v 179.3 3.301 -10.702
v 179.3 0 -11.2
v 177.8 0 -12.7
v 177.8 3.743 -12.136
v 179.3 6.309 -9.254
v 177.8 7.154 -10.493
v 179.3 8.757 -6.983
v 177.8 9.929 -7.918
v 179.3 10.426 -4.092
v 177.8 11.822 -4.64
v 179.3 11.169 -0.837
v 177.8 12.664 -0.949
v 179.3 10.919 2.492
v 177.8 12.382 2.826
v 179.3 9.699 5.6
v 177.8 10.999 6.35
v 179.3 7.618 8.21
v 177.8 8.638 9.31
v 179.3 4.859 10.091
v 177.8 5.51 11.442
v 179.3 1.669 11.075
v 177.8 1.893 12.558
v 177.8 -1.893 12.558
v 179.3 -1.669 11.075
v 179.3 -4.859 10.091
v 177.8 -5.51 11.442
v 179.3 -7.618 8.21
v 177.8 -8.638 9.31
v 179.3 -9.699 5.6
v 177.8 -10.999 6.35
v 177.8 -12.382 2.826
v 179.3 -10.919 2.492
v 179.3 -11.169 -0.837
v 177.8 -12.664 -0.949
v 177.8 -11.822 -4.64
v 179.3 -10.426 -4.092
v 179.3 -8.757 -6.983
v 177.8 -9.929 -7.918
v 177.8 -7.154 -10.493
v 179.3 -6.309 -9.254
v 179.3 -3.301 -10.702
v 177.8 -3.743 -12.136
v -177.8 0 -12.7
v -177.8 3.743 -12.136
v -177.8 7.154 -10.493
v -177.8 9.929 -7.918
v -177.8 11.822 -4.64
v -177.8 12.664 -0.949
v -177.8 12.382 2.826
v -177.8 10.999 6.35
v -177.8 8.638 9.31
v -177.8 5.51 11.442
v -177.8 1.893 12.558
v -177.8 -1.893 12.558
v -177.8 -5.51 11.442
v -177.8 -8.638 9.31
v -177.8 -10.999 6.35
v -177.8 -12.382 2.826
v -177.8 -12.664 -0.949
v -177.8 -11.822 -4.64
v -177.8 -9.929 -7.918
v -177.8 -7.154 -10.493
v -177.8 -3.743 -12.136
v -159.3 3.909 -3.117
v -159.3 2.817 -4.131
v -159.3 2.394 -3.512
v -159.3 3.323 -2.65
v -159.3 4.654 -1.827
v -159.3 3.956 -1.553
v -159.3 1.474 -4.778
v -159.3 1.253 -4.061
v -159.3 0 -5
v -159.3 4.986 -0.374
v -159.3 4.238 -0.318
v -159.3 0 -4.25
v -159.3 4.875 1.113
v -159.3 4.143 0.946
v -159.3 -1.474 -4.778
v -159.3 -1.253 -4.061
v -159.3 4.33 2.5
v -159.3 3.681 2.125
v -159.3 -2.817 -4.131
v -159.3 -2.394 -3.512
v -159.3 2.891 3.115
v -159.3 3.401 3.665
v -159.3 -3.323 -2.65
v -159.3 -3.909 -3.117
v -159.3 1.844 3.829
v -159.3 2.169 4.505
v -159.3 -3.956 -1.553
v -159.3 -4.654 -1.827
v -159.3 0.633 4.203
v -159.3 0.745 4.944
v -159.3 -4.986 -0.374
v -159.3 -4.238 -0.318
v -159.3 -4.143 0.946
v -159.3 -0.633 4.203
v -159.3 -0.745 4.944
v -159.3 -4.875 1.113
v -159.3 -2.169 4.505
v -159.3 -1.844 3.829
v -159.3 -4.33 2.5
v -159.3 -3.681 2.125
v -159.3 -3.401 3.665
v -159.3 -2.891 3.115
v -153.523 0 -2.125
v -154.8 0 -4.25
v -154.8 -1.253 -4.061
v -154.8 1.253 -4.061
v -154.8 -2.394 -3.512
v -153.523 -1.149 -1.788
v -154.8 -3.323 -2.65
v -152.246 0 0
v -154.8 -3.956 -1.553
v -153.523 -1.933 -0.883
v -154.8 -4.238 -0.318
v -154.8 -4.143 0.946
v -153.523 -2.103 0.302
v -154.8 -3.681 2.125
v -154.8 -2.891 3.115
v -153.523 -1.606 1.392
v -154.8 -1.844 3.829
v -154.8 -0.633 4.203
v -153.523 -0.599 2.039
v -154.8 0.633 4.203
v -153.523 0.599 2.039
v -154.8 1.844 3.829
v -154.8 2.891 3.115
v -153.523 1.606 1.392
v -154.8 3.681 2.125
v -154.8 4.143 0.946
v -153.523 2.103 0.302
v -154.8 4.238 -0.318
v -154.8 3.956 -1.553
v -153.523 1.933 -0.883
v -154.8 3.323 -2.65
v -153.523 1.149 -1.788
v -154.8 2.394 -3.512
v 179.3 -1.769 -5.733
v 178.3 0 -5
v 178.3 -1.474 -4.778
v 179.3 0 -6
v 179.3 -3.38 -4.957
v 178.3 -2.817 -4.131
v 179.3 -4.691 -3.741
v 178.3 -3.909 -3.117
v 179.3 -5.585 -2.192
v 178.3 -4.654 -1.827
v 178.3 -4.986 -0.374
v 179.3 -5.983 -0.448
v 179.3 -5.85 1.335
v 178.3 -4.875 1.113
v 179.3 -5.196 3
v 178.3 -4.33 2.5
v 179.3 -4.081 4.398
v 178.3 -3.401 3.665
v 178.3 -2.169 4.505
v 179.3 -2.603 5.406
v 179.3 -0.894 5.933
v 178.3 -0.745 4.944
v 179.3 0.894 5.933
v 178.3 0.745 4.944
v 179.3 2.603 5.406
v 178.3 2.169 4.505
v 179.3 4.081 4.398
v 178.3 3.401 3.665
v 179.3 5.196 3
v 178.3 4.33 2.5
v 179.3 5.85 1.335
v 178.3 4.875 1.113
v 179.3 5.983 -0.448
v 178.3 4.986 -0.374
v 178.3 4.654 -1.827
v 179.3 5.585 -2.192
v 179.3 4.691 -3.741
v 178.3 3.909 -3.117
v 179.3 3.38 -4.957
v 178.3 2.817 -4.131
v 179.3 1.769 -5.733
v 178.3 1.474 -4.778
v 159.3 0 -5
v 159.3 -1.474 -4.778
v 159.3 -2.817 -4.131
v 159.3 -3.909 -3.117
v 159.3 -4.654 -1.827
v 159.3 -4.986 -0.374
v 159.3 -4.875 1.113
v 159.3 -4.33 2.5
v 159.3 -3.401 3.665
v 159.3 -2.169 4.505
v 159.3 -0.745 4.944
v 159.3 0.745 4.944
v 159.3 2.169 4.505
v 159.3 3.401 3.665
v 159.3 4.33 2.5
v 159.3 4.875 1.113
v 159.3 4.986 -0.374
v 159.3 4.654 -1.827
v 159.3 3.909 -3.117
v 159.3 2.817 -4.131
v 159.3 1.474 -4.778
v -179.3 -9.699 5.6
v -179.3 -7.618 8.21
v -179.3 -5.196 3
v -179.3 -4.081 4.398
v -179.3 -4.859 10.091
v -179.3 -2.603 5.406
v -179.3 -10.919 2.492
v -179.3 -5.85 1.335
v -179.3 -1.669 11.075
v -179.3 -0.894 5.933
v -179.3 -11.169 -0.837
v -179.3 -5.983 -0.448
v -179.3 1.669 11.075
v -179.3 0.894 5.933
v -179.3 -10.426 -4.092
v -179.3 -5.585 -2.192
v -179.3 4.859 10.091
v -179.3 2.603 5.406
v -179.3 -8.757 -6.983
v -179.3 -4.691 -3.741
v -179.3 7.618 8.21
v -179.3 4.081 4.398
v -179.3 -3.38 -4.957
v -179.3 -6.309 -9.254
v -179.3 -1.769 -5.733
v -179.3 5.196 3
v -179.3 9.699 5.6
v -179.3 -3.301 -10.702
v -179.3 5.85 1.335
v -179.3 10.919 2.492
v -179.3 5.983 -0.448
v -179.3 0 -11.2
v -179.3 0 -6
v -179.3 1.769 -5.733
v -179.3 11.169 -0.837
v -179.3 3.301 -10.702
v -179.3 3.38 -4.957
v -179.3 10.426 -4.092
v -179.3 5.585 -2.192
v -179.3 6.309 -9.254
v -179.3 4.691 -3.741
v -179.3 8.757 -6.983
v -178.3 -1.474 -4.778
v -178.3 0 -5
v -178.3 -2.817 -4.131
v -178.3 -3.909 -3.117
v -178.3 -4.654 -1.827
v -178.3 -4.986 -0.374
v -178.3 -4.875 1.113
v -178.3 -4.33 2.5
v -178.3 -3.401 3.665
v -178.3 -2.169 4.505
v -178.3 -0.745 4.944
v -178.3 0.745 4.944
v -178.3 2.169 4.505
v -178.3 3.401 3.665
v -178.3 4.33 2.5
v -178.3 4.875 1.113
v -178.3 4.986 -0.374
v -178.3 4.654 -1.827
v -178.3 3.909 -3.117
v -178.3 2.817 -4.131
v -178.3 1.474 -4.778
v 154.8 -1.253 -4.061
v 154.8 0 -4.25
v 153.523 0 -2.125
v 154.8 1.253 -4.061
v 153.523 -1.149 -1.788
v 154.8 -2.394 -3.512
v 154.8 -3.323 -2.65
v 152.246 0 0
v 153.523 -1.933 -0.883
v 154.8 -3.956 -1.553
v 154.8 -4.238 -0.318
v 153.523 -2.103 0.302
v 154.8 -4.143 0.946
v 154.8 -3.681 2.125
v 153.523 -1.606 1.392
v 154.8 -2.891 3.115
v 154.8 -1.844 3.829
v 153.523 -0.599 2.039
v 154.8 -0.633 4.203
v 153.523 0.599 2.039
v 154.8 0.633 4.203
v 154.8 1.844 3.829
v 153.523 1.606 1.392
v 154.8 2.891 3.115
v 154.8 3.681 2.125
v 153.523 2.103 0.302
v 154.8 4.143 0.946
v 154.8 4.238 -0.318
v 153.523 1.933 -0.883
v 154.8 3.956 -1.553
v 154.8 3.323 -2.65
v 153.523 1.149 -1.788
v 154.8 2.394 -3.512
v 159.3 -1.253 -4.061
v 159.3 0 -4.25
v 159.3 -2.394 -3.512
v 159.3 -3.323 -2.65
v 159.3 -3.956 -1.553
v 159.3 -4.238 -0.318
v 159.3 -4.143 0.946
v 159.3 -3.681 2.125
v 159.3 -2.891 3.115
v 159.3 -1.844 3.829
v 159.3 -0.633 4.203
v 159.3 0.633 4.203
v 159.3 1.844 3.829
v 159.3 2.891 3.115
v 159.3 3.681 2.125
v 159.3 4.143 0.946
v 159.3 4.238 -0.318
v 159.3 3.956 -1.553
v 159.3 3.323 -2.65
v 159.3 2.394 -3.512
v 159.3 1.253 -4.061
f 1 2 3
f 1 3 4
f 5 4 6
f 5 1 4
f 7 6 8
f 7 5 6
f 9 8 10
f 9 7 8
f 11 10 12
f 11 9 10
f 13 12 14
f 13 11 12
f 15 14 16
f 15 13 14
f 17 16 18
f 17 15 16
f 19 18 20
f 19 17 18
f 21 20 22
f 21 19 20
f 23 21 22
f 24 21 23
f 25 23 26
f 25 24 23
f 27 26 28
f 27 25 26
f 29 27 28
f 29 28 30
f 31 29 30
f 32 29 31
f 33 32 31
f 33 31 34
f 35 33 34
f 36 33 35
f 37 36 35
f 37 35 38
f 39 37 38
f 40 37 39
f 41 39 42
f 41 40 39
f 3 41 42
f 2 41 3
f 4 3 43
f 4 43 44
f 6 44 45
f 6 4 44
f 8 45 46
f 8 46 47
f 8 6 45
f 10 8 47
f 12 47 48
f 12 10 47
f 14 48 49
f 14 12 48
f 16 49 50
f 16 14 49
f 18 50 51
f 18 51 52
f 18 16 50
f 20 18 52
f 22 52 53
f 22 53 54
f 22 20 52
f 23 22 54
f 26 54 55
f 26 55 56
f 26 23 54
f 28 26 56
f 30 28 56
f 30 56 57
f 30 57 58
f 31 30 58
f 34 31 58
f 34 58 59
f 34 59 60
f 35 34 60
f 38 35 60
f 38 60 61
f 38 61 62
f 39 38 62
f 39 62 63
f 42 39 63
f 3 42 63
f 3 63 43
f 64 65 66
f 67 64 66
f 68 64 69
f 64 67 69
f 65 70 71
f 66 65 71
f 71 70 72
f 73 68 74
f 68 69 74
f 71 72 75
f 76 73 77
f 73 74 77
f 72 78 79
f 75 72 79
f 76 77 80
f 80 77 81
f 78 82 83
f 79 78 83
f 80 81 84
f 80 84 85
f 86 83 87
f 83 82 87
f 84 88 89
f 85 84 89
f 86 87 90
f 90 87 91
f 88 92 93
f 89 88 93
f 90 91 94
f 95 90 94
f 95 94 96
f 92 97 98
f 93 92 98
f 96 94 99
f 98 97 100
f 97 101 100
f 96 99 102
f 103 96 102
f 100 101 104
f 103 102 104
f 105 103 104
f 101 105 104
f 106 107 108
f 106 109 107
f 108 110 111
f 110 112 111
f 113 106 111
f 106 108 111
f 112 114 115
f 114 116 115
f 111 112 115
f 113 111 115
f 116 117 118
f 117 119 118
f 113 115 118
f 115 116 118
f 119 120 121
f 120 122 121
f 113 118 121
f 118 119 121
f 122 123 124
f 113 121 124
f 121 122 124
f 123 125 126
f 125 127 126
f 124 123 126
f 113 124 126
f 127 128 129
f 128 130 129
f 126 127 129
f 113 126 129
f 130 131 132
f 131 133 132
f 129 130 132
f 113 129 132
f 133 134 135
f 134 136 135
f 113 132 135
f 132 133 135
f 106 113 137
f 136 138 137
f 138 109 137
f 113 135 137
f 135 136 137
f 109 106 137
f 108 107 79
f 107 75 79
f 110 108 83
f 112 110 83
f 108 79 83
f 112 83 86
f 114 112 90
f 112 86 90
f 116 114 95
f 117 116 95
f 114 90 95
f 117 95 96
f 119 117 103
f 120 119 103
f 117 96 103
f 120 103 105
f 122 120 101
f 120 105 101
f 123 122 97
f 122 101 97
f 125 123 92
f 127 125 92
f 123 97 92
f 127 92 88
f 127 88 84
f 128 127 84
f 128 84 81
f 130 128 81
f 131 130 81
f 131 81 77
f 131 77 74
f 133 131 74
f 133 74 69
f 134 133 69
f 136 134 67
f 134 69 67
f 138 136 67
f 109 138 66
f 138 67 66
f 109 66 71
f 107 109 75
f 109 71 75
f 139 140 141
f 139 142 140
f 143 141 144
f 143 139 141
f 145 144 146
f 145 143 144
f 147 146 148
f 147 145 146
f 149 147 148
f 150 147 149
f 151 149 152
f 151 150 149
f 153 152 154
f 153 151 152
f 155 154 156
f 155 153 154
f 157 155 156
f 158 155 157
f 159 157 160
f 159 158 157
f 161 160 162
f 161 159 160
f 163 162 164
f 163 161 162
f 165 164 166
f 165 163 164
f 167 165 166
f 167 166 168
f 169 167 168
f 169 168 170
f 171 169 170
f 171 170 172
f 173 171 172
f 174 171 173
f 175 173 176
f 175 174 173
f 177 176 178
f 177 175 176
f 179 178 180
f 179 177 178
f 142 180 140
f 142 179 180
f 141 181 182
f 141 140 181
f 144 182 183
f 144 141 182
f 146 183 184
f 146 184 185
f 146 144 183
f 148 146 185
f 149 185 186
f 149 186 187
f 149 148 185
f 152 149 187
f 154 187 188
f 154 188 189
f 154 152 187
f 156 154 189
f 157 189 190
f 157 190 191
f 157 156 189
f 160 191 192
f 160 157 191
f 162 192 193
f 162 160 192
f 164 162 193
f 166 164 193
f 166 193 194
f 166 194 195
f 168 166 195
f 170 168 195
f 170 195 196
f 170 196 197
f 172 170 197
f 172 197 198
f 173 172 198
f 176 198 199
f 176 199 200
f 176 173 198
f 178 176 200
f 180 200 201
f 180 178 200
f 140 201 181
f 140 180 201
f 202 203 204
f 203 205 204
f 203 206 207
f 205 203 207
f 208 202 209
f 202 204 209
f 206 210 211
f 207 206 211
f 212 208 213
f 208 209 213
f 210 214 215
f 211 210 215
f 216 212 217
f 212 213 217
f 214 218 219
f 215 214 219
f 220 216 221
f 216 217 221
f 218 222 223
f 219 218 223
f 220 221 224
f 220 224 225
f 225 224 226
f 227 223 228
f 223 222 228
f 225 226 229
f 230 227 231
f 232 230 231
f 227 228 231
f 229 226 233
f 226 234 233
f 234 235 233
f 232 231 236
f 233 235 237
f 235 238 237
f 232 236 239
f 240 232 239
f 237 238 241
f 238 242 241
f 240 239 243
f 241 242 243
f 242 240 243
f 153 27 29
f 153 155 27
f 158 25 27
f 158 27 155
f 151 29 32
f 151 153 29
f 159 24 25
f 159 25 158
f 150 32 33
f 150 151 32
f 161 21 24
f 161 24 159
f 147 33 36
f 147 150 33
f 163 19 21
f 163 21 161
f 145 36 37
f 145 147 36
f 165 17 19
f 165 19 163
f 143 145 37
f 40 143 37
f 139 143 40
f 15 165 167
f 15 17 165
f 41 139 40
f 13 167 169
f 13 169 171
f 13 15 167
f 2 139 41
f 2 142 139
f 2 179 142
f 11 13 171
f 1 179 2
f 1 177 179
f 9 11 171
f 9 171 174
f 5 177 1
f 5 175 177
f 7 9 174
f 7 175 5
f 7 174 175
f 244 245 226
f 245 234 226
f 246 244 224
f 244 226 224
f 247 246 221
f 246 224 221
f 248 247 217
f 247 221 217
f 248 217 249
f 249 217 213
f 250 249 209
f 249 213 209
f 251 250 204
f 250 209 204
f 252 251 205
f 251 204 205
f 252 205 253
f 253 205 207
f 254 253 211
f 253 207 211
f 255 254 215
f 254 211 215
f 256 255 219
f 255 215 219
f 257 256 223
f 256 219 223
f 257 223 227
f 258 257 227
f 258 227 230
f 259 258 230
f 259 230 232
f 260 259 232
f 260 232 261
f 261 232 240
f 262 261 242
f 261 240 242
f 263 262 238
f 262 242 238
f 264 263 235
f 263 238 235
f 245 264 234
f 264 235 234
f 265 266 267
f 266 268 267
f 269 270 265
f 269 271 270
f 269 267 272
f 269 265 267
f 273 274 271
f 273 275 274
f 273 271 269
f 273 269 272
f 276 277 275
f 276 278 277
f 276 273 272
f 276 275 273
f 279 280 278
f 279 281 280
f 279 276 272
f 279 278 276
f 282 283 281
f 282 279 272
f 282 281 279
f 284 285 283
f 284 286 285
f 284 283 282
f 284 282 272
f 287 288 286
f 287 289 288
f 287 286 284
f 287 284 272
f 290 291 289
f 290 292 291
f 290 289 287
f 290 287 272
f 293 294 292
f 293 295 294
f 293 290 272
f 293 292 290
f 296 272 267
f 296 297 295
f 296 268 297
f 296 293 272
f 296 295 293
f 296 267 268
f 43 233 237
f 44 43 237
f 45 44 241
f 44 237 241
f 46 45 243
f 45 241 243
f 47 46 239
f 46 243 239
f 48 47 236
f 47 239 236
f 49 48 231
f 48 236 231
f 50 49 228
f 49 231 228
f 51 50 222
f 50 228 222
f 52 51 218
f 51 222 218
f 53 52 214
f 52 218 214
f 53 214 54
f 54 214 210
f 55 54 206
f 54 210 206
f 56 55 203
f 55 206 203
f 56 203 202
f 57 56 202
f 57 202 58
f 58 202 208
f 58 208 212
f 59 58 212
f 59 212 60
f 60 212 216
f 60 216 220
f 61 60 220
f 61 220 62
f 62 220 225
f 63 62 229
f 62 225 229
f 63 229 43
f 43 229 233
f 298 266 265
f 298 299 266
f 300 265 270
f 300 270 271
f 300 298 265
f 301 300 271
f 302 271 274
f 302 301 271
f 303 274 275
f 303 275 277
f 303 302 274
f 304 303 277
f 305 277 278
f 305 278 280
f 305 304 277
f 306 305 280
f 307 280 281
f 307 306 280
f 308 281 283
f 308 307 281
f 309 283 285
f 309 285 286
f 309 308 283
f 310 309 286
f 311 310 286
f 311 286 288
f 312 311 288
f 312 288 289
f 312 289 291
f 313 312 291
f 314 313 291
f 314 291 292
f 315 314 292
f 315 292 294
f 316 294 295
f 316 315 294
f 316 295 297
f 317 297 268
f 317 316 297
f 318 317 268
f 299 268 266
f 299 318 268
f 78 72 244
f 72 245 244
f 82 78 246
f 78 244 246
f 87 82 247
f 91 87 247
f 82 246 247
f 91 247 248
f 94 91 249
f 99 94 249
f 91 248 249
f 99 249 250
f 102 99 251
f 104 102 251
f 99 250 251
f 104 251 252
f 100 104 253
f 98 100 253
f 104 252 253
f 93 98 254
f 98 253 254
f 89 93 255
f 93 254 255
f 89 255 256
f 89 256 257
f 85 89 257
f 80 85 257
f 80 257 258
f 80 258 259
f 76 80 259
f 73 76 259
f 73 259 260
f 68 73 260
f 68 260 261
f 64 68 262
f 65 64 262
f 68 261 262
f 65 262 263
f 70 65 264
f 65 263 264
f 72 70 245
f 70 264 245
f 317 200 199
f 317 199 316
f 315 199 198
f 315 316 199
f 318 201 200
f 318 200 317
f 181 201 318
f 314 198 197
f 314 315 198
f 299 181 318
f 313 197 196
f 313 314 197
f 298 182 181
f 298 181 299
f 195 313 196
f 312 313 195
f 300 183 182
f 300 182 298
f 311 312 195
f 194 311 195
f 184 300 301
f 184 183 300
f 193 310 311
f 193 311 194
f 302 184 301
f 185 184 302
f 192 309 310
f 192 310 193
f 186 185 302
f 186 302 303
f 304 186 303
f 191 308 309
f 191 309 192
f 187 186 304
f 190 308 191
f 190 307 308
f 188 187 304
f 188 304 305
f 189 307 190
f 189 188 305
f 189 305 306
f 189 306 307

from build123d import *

# Parameters (mm, degrees)
SKETCH2_R           = 12.7
BOSS_EXTRUDE1_DEPTH = 179.3
CHAMFER1_SIZE       = 1.5


with BuildPart() as part:
    # Sketch2 → Boss-Extrude1 (new, symmetric)
    with BuildSketch(Plane(origin=(0, 0, 0), x_dir=(0, 0, -1), z_dir=(1, 0, 0))):
        Circle(SKETCH2_R)
    extrude(amount=BOSS_EXTRUDE1_DEPTH, both=True)

    # Chamfer1
    chamfer1_edges = [part.edges().sort_by_distance(p)[0] for p in [
        (-179.3, 0, 12.7),
        (179.3, 0, 12.7),
    ]]
    chamfer(chamfer1_edges, length=CHAMFER1_SIZE)

    # Sketch5 → M10 Tapped Hole1 (revolve, cut)
    with BuildSketch(Plane(origin=(179.3, 0, 0), x_dir=(0, 0, -1), z_dir=(0, 1, 0))):
        Polygon((0, 0), (0, 27.053657631), (4.25, 24.5), (4.25, 20), (5, 20), (5, 1), (6, 0), align=None)
    m10_tapped_hole1 = revolve(axis=Axis((185.65, 0, 0), (-1, 0, 0)), mode=Mode.SUBTRACT)

    # Mirror1: M10 Tapped Hole1 across plane
    add(m10_tapped_hole1.mirror(Plane(origin=(0, 0, 0), x_dir=(0, 0, 1), z_dir=(1, 0, 0))), mode=Mode.SUBTRACT)


solid = part.part
